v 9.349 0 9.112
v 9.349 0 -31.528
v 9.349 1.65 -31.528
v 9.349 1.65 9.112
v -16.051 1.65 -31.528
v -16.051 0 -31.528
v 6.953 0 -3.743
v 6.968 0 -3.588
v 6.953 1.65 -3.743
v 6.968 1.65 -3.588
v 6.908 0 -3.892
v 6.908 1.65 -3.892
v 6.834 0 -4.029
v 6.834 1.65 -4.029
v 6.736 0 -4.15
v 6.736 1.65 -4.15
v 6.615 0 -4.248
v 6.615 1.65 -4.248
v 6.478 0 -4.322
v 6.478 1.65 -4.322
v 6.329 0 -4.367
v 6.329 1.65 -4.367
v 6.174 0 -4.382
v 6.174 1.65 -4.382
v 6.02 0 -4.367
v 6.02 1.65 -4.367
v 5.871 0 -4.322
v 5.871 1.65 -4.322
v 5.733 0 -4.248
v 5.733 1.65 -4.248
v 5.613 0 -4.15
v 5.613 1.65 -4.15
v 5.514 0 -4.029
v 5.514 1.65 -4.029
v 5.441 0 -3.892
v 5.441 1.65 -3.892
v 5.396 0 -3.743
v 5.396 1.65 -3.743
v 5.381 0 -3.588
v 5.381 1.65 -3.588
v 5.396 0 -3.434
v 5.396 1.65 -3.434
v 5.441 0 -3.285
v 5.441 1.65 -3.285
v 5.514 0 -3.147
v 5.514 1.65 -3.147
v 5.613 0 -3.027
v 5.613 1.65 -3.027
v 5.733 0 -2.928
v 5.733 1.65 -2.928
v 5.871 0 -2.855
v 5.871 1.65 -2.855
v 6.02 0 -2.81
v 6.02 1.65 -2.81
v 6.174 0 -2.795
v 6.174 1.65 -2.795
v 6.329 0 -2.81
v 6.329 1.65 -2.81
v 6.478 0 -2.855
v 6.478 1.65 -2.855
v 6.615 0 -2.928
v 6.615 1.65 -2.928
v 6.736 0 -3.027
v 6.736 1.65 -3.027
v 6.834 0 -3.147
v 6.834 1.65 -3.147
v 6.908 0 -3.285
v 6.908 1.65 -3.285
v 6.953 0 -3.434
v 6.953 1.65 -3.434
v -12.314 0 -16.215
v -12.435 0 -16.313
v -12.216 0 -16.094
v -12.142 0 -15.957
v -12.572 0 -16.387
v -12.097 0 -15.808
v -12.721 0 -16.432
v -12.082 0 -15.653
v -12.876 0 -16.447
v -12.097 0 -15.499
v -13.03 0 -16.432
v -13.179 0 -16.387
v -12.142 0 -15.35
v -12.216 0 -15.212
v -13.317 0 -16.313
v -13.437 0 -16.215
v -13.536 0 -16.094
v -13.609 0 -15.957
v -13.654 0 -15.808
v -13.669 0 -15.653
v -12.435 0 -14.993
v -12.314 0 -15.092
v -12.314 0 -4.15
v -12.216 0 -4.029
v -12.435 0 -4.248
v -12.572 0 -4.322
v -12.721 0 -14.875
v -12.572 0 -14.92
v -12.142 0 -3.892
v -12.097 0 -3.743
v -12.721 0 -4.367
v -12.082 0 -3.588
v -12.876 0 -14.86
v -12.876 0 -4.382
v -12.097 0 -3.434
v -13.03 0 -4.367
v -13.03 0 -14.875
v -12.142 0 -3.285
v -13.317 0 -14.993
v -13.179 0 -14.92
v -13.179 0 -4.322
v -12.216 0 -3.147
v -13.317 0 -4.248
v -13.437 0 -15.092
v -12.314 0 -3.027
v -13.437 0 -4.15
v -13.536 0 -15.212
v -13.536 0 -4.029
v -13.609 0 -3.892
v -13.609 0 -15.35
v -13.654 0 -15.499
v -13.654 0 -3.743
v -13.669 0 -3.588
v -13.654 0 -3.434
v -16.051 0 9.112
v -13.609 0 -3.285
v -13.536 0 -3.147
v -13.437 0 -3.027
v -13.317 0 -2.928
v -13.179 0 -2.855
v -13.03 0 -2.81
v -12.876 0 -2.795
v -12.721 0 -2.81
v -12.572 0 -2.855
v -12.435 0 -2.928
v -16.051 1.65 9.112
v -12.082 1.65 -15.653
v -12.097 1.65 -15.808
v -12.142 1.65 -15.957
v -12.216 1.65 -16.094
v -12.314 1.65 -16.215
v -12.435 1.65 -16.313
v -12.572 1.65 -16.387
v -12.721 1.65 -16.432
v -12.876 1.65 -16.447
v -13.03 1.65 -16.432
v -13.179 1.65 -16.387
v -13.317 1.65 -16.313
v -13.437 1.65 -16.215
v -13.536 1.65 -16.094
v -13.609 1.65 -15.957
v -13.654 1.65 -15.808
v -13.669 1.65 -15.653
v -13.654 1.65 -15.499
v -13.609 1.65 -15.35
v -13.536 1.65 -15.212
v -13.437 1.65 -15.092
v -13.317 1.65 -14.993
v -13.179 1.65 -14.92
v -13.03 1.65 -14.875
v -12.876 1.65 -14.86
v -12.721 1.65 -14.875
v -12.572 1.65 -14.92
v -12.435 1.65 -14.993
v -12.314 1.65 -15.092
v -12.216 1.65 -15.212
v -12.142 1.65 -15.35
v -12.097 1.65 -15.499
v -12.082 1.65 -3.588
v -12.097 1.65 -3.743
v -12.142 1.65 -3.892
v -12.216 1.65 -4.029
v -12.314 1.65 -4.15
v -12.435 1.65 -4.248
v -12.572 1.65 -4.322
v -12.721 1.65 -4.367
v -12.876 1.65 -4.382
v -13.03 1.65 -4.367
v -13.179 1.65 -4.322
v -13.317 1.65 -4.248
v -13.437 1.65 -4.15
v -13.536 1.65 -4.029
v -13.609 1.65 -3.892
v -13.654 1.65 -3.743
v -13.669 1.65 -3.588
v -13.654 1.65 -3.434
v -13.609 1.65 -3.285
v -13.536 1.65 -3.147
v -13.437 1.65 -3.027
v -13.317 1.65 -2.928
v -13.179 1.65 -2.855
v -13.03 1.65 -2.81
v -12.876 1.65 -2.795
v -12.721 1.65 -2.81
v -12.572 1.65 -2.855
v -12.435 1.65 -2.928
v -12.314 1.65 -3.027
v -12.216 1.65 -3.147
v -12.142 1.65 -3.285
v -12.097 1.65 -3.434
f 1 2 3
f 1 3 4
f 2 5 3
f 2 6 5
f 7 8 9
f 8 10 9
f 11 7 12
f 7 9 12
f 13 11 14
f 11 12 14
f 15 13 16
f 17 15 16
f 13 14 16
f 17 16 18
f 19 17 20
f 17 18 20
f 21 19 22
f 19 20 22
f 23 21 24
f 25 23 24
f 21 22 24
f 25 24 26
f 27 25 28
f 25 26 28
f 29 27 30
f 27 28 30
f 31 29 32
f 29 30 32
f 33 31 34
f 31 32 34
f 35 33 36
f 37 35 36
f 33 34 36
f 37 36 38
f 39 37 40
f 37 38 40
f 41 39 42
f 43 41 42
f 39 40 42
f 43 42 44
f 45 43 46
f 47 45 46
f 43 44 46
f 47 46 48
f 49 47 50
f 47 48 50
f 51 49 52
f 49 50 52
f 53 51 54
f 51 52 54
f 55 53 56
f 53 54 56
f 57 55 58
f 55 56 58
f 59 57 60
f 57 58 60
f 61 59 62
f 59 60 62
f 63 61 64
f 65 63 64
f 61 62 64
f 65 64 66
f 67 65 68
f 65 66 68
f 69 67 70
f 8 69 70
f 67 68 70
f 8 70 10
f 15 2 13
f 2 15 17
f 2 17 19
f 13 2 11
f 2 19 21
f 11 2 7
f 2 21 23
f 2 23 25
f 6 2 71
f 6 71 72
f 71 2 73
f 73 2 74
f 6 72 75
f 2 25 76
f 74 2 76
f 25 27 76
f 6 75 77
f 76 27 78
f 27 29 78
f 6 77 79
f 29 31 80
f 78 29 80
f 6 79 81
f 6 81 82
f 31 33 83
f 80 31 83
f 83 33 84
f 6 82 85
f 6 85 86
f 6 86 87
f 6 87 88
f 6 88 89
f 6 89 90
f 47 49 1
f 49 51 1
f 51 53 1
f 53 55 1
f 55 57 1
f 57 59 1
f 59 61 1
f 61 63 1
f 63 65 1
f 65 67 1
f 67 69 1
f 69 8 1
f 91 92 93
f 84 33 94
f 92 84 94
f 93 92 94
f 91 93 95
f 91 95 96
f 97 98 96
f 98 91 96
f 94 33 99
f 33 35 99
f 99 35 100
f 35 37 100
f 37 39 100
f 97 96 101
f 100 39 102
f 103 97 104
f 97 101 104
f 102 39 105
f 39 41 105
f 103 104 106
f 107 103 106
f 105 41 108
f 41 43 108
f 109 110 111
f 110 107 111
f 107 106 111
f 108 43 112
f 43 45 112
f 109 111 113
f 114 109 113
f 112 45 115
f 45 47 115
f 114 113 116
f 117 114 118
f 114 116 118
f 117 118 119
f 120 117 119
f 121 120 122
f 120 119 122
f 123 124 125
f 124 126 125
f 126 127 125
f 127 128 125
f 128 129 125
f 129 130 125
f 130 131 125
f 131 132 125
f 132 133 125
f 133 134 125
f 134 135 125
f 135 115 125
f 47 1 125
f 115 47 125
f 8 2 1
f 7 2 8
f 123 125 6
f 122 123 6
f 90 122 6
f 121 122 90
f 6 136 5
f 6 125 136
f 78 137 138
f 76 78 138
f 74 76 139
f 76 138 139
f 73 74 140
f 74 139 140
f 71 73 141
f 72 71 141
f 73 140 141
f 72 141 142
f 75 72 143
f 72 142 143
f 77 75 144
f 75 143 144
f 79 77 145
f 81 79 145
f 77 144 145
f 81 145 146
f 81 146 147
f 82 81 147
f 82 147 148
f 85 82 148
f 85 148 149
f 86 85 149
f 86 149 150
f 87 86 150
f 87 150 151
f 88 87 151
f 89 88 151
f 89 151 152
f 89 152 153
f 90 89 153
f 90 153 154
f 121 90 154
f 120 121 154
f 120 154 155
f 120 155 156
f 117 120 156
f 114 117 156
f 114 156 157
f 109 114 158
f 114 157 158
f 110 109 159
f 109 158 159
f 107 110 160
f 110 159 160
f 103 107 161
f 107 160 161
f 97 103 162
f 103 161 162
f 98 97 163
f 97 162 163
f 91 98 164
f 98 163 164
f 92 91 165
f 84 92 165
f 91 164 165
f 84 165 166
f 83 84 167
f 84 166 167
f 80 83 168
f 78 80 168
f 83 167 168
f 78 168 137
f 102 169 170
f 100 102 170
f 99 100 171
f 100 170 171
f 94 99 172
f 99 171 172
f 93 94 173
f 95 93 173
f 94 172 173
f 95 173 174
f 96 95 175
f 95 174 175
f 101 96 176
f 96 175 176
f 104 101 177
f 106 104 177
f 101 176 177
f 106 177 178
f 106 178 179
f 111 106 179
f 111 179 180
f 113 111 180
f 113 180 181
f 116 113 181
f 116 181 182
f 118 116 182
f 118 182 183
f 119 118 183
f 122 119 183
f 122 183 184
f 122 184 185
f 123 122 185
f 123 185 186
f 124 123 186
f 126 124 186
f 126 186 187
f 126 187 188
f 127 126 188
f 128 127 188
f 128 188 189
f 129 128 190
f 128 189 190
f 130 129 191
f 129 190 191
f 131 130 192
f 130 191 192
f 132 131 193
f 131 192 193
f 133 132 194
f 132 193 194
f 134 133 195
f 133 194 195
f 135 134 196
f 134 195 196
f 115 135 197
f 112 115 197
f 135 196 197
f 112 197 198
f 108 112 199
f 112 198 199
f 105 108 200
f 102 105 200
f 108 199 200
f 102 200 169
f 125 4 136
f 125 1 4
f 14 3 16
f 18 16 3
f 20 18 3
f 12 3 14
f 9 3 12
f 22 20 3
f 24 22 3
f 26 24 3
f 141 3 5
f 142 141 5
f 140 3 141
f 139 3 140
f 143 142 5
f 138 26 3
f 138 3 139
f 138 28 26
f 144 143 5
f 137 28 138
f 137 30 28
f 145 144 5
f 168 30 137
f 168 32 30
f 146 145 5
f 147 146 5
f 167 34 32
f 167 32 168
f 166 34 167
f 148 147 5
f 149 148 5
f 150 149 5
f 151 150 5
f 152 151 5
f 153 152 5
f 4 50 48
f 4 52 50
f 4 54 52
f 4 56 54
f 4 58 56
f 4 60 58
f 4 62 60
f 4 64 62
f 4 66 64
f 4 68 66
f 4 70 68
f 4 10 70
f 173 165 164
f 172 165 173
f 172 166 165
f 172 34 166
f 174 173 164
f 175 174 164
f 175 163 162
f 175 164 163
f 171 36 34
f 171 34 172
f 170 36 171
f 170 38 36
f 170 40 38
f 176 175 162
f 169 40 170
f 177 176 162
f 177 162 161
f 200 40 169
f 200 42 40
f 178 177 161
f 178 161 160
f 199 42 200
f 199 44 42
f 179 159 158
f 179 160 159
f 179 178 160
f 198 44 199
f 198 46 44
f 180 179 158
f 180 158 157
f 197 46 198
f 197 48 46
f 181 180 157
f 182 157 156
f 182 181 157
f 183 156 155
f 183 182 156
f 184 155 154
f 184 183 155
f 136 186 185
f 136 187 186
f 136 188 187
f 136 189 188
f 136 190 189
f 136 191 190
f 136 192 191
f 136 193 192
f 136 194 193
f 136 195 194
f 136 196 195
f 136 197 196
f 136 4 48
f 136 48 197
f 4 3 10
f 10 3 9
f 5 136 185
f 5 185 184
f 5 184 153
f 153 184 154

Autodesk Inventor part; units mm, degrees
ref_plane "YZ Plane" through (0, 0, 0) normal (1, 0, 0) x (0, 1, 0)
ref_plane "XZ Plane" through (0, 0, 0) normal (0, 1, 0) x (-1, 0, 0)
ref_plane "XY Plane" through (0, 0, 0) normal (0, 0, 1) x (1, 0, 0)
sketch "Sketch1" plane through (0, 0, 0) normal (0, 1, 0) x (-1, 0, 0)
  line L0 (-9.3494, 9.1116) -> (16.0506, 9.1116)
  line L1 (16.0506, 9.1116) -> (16.0506, -31.5284)
  line L2 (16.0506, -31.5284) -> (-9.3494, -31.5284)
  line L3 (-9.3494, -31.5284) -> (-9.3494, 9.1116)
  point P0 (0, 0)
  dimension "d0" = 25.4
  dimension "d1" = 40.64
extrude "Extrusion1" add sketch "Sketch1" along normal blind 1.65
sketch "Sketch2" plane through (0, 1.65, 0) normal (0, 1, 0) x (1, 0, 0)
  line L0 (-16.0506, -9.1116) -> (9.3494, -9.1116) projected
  line L1 (9.3494, -9.1116) -> (9.3494, 31.5284) projected
  line L2 (9.3494, 31.5284) -> (-16.0506, 31.5284) projected
  line L3 (-16.0506, 31.5284) -> (-16.0506, -9.1116) projected
  circle A0 centre (-12.8756, 15.6534) radius 0.7937
  circle A1 centre (-12.8756, 3.5884) radius 0.7937
  circle A2 centre (6.1744, 3.5884) radius 0.7937
  point P0 (0, 0)
  dimension "d4" = 1.5875
  dimension "d5" = 1.5875
  dimension "d6" = 1.5875
  dimension "d7" = 3.175
  dimension "d8" = 3.175
  dimension "d9" = 3.175
  dimension "d10" = 12.7
  dimension "d11" = 12.7
  dimension "d12" = 15.875
extrude "Extrusion2" cut sketch "Sketch2" against normal up to next contours A0 | A1 | A2
properties part number "InjectorBoard2"
